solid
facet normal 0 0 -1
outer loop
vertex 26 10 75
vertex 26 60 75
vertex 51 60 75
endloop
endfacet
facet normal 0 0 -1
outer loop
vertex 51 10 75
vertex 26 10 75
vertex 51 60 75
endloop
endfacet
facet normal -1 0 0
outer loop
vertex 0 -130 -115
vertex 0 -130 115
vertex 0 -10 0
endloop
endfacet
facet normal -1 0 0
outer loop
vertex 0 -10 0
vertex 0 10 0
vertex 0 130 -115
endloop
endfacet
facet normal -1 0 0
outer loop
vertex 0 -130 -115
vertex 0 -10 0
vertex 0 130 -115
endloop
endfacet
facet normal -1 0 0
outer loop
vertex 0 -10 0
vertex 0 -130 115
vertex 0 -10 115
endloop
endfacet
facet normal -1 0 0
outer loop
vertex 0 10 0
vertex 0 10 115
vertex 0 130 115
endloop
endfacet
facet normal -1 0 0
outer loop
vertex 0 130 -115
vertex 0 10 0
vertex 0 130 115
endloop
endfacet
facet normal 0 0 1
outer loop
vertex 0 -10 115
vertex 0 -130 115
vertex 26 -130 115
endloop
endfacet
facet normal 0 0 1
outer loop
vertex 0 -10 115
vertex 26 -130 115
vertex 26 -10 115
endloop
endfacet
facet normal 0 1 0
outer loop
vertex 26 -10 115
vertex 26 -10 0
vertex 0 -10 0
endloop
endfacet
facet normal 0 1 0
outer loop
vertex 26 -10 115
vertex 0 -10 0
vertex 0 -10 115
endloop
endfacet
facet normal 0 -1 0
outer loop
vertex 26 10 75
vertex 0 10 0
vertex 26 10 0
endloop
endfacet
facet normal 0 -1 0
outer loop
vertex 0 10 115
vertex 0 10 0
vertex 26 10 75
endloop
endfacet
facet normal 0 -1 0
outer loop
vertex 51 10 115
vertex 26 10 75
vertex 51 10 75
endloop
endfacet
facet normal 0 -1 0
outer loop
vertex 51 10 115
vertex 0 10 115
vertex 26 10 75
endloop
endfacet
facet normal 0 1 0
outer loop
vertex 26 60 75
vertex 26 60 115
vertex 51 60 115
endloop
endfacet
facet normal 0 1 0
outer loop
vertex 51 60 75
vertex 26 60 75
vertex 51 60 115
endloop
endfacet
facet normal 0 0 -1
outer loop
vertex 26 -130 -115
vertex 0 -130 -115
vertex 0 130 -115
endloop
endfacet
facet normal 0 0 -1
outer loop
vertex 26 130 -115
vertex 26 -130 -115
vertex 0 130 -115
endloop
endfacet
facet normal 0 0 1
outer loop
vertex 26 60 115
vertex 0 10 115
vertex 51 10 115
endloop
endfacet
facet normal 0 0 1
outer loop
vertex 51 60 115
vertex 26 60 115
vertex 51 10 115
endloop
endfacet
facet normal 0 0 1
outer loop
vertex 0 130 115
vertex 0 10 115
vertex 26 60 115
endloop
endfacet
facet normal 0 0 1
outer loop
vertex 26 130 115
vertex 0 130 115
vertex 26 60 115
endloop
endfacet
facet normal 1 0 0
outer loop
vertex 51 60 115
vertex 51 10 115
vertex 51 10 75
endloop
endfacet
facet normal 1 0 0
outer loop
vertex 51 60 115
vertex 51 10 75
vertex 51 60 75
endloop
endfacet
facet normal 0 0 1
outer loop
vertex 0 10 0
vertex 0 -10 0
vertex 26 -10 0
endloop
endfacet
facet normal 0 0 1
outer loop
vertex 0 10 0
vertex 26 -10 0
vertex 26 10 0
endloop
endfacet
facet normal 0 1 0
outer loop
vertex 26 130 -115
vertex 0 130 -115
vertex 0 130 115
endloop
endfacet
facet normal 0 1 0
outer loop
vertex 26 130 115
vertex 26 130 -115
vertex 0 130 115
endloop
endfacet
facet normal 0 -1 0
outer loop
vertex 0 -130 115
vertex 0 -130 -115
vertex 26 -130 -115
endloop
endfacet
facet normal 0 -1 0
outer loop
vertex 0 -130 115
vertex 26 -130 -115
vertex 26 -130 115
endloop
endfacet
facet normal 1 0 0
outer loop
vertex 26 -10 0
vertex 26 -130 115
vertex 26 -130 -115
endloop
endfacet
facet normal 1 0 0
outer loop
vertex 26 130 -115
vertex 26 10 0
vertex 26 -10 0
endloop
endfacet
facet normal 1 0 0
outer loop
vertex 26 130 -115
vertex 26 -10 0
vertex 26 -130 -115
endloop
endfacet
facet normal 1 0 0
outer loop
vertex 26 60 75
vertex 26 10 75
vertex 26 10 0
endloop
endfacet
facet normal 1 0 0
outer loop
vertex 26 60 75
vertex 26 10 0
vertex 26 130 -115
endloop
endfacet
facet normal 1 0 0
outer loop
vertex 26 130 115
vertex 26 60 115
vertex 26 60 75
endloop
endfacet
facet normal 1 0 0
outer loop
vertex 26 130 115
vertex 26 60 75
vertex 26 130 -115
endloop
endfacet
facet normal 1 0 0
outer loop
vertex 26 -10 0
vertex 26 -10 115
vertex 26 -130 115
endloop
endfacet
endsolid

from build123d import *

# Parameters (mm, degrees)
F0_W     = 260
F0_H     = 230
F1_DEPTH = 26
F2_W     = 20
F2_H     = 115
F3_DEPTH = 30
F4_W     = 25
F4_H     = 50
F5_DEPTH = 40


with BuildPart() as f1:
    # F0 (on Right) → F1 (new body)
    with BuildSketch(Plane.YZ):
        Rectangle(F0_W, F0_H)
    extrude(amount=F1_DEPTH)

    # F2 (on face) → F3 (cut)
    with BuildSketch(Plane.YZ.offset(26)):
        with Locations((0, 57.5)):
            Rectangle(F2_W, F2_H)
    extrude(amount=-F3_DEPTH, mode=Mode.SUBTRACT)

    # F4 (on face) → F5 (join)
    with BuildSketch(Plane.XY.offset(115)):
        with Locations((38.5, 35)):
            Rectangle(F4_W, F4_H)
    extrude(amount=-F5_DEPTH)


solid = f1.part
